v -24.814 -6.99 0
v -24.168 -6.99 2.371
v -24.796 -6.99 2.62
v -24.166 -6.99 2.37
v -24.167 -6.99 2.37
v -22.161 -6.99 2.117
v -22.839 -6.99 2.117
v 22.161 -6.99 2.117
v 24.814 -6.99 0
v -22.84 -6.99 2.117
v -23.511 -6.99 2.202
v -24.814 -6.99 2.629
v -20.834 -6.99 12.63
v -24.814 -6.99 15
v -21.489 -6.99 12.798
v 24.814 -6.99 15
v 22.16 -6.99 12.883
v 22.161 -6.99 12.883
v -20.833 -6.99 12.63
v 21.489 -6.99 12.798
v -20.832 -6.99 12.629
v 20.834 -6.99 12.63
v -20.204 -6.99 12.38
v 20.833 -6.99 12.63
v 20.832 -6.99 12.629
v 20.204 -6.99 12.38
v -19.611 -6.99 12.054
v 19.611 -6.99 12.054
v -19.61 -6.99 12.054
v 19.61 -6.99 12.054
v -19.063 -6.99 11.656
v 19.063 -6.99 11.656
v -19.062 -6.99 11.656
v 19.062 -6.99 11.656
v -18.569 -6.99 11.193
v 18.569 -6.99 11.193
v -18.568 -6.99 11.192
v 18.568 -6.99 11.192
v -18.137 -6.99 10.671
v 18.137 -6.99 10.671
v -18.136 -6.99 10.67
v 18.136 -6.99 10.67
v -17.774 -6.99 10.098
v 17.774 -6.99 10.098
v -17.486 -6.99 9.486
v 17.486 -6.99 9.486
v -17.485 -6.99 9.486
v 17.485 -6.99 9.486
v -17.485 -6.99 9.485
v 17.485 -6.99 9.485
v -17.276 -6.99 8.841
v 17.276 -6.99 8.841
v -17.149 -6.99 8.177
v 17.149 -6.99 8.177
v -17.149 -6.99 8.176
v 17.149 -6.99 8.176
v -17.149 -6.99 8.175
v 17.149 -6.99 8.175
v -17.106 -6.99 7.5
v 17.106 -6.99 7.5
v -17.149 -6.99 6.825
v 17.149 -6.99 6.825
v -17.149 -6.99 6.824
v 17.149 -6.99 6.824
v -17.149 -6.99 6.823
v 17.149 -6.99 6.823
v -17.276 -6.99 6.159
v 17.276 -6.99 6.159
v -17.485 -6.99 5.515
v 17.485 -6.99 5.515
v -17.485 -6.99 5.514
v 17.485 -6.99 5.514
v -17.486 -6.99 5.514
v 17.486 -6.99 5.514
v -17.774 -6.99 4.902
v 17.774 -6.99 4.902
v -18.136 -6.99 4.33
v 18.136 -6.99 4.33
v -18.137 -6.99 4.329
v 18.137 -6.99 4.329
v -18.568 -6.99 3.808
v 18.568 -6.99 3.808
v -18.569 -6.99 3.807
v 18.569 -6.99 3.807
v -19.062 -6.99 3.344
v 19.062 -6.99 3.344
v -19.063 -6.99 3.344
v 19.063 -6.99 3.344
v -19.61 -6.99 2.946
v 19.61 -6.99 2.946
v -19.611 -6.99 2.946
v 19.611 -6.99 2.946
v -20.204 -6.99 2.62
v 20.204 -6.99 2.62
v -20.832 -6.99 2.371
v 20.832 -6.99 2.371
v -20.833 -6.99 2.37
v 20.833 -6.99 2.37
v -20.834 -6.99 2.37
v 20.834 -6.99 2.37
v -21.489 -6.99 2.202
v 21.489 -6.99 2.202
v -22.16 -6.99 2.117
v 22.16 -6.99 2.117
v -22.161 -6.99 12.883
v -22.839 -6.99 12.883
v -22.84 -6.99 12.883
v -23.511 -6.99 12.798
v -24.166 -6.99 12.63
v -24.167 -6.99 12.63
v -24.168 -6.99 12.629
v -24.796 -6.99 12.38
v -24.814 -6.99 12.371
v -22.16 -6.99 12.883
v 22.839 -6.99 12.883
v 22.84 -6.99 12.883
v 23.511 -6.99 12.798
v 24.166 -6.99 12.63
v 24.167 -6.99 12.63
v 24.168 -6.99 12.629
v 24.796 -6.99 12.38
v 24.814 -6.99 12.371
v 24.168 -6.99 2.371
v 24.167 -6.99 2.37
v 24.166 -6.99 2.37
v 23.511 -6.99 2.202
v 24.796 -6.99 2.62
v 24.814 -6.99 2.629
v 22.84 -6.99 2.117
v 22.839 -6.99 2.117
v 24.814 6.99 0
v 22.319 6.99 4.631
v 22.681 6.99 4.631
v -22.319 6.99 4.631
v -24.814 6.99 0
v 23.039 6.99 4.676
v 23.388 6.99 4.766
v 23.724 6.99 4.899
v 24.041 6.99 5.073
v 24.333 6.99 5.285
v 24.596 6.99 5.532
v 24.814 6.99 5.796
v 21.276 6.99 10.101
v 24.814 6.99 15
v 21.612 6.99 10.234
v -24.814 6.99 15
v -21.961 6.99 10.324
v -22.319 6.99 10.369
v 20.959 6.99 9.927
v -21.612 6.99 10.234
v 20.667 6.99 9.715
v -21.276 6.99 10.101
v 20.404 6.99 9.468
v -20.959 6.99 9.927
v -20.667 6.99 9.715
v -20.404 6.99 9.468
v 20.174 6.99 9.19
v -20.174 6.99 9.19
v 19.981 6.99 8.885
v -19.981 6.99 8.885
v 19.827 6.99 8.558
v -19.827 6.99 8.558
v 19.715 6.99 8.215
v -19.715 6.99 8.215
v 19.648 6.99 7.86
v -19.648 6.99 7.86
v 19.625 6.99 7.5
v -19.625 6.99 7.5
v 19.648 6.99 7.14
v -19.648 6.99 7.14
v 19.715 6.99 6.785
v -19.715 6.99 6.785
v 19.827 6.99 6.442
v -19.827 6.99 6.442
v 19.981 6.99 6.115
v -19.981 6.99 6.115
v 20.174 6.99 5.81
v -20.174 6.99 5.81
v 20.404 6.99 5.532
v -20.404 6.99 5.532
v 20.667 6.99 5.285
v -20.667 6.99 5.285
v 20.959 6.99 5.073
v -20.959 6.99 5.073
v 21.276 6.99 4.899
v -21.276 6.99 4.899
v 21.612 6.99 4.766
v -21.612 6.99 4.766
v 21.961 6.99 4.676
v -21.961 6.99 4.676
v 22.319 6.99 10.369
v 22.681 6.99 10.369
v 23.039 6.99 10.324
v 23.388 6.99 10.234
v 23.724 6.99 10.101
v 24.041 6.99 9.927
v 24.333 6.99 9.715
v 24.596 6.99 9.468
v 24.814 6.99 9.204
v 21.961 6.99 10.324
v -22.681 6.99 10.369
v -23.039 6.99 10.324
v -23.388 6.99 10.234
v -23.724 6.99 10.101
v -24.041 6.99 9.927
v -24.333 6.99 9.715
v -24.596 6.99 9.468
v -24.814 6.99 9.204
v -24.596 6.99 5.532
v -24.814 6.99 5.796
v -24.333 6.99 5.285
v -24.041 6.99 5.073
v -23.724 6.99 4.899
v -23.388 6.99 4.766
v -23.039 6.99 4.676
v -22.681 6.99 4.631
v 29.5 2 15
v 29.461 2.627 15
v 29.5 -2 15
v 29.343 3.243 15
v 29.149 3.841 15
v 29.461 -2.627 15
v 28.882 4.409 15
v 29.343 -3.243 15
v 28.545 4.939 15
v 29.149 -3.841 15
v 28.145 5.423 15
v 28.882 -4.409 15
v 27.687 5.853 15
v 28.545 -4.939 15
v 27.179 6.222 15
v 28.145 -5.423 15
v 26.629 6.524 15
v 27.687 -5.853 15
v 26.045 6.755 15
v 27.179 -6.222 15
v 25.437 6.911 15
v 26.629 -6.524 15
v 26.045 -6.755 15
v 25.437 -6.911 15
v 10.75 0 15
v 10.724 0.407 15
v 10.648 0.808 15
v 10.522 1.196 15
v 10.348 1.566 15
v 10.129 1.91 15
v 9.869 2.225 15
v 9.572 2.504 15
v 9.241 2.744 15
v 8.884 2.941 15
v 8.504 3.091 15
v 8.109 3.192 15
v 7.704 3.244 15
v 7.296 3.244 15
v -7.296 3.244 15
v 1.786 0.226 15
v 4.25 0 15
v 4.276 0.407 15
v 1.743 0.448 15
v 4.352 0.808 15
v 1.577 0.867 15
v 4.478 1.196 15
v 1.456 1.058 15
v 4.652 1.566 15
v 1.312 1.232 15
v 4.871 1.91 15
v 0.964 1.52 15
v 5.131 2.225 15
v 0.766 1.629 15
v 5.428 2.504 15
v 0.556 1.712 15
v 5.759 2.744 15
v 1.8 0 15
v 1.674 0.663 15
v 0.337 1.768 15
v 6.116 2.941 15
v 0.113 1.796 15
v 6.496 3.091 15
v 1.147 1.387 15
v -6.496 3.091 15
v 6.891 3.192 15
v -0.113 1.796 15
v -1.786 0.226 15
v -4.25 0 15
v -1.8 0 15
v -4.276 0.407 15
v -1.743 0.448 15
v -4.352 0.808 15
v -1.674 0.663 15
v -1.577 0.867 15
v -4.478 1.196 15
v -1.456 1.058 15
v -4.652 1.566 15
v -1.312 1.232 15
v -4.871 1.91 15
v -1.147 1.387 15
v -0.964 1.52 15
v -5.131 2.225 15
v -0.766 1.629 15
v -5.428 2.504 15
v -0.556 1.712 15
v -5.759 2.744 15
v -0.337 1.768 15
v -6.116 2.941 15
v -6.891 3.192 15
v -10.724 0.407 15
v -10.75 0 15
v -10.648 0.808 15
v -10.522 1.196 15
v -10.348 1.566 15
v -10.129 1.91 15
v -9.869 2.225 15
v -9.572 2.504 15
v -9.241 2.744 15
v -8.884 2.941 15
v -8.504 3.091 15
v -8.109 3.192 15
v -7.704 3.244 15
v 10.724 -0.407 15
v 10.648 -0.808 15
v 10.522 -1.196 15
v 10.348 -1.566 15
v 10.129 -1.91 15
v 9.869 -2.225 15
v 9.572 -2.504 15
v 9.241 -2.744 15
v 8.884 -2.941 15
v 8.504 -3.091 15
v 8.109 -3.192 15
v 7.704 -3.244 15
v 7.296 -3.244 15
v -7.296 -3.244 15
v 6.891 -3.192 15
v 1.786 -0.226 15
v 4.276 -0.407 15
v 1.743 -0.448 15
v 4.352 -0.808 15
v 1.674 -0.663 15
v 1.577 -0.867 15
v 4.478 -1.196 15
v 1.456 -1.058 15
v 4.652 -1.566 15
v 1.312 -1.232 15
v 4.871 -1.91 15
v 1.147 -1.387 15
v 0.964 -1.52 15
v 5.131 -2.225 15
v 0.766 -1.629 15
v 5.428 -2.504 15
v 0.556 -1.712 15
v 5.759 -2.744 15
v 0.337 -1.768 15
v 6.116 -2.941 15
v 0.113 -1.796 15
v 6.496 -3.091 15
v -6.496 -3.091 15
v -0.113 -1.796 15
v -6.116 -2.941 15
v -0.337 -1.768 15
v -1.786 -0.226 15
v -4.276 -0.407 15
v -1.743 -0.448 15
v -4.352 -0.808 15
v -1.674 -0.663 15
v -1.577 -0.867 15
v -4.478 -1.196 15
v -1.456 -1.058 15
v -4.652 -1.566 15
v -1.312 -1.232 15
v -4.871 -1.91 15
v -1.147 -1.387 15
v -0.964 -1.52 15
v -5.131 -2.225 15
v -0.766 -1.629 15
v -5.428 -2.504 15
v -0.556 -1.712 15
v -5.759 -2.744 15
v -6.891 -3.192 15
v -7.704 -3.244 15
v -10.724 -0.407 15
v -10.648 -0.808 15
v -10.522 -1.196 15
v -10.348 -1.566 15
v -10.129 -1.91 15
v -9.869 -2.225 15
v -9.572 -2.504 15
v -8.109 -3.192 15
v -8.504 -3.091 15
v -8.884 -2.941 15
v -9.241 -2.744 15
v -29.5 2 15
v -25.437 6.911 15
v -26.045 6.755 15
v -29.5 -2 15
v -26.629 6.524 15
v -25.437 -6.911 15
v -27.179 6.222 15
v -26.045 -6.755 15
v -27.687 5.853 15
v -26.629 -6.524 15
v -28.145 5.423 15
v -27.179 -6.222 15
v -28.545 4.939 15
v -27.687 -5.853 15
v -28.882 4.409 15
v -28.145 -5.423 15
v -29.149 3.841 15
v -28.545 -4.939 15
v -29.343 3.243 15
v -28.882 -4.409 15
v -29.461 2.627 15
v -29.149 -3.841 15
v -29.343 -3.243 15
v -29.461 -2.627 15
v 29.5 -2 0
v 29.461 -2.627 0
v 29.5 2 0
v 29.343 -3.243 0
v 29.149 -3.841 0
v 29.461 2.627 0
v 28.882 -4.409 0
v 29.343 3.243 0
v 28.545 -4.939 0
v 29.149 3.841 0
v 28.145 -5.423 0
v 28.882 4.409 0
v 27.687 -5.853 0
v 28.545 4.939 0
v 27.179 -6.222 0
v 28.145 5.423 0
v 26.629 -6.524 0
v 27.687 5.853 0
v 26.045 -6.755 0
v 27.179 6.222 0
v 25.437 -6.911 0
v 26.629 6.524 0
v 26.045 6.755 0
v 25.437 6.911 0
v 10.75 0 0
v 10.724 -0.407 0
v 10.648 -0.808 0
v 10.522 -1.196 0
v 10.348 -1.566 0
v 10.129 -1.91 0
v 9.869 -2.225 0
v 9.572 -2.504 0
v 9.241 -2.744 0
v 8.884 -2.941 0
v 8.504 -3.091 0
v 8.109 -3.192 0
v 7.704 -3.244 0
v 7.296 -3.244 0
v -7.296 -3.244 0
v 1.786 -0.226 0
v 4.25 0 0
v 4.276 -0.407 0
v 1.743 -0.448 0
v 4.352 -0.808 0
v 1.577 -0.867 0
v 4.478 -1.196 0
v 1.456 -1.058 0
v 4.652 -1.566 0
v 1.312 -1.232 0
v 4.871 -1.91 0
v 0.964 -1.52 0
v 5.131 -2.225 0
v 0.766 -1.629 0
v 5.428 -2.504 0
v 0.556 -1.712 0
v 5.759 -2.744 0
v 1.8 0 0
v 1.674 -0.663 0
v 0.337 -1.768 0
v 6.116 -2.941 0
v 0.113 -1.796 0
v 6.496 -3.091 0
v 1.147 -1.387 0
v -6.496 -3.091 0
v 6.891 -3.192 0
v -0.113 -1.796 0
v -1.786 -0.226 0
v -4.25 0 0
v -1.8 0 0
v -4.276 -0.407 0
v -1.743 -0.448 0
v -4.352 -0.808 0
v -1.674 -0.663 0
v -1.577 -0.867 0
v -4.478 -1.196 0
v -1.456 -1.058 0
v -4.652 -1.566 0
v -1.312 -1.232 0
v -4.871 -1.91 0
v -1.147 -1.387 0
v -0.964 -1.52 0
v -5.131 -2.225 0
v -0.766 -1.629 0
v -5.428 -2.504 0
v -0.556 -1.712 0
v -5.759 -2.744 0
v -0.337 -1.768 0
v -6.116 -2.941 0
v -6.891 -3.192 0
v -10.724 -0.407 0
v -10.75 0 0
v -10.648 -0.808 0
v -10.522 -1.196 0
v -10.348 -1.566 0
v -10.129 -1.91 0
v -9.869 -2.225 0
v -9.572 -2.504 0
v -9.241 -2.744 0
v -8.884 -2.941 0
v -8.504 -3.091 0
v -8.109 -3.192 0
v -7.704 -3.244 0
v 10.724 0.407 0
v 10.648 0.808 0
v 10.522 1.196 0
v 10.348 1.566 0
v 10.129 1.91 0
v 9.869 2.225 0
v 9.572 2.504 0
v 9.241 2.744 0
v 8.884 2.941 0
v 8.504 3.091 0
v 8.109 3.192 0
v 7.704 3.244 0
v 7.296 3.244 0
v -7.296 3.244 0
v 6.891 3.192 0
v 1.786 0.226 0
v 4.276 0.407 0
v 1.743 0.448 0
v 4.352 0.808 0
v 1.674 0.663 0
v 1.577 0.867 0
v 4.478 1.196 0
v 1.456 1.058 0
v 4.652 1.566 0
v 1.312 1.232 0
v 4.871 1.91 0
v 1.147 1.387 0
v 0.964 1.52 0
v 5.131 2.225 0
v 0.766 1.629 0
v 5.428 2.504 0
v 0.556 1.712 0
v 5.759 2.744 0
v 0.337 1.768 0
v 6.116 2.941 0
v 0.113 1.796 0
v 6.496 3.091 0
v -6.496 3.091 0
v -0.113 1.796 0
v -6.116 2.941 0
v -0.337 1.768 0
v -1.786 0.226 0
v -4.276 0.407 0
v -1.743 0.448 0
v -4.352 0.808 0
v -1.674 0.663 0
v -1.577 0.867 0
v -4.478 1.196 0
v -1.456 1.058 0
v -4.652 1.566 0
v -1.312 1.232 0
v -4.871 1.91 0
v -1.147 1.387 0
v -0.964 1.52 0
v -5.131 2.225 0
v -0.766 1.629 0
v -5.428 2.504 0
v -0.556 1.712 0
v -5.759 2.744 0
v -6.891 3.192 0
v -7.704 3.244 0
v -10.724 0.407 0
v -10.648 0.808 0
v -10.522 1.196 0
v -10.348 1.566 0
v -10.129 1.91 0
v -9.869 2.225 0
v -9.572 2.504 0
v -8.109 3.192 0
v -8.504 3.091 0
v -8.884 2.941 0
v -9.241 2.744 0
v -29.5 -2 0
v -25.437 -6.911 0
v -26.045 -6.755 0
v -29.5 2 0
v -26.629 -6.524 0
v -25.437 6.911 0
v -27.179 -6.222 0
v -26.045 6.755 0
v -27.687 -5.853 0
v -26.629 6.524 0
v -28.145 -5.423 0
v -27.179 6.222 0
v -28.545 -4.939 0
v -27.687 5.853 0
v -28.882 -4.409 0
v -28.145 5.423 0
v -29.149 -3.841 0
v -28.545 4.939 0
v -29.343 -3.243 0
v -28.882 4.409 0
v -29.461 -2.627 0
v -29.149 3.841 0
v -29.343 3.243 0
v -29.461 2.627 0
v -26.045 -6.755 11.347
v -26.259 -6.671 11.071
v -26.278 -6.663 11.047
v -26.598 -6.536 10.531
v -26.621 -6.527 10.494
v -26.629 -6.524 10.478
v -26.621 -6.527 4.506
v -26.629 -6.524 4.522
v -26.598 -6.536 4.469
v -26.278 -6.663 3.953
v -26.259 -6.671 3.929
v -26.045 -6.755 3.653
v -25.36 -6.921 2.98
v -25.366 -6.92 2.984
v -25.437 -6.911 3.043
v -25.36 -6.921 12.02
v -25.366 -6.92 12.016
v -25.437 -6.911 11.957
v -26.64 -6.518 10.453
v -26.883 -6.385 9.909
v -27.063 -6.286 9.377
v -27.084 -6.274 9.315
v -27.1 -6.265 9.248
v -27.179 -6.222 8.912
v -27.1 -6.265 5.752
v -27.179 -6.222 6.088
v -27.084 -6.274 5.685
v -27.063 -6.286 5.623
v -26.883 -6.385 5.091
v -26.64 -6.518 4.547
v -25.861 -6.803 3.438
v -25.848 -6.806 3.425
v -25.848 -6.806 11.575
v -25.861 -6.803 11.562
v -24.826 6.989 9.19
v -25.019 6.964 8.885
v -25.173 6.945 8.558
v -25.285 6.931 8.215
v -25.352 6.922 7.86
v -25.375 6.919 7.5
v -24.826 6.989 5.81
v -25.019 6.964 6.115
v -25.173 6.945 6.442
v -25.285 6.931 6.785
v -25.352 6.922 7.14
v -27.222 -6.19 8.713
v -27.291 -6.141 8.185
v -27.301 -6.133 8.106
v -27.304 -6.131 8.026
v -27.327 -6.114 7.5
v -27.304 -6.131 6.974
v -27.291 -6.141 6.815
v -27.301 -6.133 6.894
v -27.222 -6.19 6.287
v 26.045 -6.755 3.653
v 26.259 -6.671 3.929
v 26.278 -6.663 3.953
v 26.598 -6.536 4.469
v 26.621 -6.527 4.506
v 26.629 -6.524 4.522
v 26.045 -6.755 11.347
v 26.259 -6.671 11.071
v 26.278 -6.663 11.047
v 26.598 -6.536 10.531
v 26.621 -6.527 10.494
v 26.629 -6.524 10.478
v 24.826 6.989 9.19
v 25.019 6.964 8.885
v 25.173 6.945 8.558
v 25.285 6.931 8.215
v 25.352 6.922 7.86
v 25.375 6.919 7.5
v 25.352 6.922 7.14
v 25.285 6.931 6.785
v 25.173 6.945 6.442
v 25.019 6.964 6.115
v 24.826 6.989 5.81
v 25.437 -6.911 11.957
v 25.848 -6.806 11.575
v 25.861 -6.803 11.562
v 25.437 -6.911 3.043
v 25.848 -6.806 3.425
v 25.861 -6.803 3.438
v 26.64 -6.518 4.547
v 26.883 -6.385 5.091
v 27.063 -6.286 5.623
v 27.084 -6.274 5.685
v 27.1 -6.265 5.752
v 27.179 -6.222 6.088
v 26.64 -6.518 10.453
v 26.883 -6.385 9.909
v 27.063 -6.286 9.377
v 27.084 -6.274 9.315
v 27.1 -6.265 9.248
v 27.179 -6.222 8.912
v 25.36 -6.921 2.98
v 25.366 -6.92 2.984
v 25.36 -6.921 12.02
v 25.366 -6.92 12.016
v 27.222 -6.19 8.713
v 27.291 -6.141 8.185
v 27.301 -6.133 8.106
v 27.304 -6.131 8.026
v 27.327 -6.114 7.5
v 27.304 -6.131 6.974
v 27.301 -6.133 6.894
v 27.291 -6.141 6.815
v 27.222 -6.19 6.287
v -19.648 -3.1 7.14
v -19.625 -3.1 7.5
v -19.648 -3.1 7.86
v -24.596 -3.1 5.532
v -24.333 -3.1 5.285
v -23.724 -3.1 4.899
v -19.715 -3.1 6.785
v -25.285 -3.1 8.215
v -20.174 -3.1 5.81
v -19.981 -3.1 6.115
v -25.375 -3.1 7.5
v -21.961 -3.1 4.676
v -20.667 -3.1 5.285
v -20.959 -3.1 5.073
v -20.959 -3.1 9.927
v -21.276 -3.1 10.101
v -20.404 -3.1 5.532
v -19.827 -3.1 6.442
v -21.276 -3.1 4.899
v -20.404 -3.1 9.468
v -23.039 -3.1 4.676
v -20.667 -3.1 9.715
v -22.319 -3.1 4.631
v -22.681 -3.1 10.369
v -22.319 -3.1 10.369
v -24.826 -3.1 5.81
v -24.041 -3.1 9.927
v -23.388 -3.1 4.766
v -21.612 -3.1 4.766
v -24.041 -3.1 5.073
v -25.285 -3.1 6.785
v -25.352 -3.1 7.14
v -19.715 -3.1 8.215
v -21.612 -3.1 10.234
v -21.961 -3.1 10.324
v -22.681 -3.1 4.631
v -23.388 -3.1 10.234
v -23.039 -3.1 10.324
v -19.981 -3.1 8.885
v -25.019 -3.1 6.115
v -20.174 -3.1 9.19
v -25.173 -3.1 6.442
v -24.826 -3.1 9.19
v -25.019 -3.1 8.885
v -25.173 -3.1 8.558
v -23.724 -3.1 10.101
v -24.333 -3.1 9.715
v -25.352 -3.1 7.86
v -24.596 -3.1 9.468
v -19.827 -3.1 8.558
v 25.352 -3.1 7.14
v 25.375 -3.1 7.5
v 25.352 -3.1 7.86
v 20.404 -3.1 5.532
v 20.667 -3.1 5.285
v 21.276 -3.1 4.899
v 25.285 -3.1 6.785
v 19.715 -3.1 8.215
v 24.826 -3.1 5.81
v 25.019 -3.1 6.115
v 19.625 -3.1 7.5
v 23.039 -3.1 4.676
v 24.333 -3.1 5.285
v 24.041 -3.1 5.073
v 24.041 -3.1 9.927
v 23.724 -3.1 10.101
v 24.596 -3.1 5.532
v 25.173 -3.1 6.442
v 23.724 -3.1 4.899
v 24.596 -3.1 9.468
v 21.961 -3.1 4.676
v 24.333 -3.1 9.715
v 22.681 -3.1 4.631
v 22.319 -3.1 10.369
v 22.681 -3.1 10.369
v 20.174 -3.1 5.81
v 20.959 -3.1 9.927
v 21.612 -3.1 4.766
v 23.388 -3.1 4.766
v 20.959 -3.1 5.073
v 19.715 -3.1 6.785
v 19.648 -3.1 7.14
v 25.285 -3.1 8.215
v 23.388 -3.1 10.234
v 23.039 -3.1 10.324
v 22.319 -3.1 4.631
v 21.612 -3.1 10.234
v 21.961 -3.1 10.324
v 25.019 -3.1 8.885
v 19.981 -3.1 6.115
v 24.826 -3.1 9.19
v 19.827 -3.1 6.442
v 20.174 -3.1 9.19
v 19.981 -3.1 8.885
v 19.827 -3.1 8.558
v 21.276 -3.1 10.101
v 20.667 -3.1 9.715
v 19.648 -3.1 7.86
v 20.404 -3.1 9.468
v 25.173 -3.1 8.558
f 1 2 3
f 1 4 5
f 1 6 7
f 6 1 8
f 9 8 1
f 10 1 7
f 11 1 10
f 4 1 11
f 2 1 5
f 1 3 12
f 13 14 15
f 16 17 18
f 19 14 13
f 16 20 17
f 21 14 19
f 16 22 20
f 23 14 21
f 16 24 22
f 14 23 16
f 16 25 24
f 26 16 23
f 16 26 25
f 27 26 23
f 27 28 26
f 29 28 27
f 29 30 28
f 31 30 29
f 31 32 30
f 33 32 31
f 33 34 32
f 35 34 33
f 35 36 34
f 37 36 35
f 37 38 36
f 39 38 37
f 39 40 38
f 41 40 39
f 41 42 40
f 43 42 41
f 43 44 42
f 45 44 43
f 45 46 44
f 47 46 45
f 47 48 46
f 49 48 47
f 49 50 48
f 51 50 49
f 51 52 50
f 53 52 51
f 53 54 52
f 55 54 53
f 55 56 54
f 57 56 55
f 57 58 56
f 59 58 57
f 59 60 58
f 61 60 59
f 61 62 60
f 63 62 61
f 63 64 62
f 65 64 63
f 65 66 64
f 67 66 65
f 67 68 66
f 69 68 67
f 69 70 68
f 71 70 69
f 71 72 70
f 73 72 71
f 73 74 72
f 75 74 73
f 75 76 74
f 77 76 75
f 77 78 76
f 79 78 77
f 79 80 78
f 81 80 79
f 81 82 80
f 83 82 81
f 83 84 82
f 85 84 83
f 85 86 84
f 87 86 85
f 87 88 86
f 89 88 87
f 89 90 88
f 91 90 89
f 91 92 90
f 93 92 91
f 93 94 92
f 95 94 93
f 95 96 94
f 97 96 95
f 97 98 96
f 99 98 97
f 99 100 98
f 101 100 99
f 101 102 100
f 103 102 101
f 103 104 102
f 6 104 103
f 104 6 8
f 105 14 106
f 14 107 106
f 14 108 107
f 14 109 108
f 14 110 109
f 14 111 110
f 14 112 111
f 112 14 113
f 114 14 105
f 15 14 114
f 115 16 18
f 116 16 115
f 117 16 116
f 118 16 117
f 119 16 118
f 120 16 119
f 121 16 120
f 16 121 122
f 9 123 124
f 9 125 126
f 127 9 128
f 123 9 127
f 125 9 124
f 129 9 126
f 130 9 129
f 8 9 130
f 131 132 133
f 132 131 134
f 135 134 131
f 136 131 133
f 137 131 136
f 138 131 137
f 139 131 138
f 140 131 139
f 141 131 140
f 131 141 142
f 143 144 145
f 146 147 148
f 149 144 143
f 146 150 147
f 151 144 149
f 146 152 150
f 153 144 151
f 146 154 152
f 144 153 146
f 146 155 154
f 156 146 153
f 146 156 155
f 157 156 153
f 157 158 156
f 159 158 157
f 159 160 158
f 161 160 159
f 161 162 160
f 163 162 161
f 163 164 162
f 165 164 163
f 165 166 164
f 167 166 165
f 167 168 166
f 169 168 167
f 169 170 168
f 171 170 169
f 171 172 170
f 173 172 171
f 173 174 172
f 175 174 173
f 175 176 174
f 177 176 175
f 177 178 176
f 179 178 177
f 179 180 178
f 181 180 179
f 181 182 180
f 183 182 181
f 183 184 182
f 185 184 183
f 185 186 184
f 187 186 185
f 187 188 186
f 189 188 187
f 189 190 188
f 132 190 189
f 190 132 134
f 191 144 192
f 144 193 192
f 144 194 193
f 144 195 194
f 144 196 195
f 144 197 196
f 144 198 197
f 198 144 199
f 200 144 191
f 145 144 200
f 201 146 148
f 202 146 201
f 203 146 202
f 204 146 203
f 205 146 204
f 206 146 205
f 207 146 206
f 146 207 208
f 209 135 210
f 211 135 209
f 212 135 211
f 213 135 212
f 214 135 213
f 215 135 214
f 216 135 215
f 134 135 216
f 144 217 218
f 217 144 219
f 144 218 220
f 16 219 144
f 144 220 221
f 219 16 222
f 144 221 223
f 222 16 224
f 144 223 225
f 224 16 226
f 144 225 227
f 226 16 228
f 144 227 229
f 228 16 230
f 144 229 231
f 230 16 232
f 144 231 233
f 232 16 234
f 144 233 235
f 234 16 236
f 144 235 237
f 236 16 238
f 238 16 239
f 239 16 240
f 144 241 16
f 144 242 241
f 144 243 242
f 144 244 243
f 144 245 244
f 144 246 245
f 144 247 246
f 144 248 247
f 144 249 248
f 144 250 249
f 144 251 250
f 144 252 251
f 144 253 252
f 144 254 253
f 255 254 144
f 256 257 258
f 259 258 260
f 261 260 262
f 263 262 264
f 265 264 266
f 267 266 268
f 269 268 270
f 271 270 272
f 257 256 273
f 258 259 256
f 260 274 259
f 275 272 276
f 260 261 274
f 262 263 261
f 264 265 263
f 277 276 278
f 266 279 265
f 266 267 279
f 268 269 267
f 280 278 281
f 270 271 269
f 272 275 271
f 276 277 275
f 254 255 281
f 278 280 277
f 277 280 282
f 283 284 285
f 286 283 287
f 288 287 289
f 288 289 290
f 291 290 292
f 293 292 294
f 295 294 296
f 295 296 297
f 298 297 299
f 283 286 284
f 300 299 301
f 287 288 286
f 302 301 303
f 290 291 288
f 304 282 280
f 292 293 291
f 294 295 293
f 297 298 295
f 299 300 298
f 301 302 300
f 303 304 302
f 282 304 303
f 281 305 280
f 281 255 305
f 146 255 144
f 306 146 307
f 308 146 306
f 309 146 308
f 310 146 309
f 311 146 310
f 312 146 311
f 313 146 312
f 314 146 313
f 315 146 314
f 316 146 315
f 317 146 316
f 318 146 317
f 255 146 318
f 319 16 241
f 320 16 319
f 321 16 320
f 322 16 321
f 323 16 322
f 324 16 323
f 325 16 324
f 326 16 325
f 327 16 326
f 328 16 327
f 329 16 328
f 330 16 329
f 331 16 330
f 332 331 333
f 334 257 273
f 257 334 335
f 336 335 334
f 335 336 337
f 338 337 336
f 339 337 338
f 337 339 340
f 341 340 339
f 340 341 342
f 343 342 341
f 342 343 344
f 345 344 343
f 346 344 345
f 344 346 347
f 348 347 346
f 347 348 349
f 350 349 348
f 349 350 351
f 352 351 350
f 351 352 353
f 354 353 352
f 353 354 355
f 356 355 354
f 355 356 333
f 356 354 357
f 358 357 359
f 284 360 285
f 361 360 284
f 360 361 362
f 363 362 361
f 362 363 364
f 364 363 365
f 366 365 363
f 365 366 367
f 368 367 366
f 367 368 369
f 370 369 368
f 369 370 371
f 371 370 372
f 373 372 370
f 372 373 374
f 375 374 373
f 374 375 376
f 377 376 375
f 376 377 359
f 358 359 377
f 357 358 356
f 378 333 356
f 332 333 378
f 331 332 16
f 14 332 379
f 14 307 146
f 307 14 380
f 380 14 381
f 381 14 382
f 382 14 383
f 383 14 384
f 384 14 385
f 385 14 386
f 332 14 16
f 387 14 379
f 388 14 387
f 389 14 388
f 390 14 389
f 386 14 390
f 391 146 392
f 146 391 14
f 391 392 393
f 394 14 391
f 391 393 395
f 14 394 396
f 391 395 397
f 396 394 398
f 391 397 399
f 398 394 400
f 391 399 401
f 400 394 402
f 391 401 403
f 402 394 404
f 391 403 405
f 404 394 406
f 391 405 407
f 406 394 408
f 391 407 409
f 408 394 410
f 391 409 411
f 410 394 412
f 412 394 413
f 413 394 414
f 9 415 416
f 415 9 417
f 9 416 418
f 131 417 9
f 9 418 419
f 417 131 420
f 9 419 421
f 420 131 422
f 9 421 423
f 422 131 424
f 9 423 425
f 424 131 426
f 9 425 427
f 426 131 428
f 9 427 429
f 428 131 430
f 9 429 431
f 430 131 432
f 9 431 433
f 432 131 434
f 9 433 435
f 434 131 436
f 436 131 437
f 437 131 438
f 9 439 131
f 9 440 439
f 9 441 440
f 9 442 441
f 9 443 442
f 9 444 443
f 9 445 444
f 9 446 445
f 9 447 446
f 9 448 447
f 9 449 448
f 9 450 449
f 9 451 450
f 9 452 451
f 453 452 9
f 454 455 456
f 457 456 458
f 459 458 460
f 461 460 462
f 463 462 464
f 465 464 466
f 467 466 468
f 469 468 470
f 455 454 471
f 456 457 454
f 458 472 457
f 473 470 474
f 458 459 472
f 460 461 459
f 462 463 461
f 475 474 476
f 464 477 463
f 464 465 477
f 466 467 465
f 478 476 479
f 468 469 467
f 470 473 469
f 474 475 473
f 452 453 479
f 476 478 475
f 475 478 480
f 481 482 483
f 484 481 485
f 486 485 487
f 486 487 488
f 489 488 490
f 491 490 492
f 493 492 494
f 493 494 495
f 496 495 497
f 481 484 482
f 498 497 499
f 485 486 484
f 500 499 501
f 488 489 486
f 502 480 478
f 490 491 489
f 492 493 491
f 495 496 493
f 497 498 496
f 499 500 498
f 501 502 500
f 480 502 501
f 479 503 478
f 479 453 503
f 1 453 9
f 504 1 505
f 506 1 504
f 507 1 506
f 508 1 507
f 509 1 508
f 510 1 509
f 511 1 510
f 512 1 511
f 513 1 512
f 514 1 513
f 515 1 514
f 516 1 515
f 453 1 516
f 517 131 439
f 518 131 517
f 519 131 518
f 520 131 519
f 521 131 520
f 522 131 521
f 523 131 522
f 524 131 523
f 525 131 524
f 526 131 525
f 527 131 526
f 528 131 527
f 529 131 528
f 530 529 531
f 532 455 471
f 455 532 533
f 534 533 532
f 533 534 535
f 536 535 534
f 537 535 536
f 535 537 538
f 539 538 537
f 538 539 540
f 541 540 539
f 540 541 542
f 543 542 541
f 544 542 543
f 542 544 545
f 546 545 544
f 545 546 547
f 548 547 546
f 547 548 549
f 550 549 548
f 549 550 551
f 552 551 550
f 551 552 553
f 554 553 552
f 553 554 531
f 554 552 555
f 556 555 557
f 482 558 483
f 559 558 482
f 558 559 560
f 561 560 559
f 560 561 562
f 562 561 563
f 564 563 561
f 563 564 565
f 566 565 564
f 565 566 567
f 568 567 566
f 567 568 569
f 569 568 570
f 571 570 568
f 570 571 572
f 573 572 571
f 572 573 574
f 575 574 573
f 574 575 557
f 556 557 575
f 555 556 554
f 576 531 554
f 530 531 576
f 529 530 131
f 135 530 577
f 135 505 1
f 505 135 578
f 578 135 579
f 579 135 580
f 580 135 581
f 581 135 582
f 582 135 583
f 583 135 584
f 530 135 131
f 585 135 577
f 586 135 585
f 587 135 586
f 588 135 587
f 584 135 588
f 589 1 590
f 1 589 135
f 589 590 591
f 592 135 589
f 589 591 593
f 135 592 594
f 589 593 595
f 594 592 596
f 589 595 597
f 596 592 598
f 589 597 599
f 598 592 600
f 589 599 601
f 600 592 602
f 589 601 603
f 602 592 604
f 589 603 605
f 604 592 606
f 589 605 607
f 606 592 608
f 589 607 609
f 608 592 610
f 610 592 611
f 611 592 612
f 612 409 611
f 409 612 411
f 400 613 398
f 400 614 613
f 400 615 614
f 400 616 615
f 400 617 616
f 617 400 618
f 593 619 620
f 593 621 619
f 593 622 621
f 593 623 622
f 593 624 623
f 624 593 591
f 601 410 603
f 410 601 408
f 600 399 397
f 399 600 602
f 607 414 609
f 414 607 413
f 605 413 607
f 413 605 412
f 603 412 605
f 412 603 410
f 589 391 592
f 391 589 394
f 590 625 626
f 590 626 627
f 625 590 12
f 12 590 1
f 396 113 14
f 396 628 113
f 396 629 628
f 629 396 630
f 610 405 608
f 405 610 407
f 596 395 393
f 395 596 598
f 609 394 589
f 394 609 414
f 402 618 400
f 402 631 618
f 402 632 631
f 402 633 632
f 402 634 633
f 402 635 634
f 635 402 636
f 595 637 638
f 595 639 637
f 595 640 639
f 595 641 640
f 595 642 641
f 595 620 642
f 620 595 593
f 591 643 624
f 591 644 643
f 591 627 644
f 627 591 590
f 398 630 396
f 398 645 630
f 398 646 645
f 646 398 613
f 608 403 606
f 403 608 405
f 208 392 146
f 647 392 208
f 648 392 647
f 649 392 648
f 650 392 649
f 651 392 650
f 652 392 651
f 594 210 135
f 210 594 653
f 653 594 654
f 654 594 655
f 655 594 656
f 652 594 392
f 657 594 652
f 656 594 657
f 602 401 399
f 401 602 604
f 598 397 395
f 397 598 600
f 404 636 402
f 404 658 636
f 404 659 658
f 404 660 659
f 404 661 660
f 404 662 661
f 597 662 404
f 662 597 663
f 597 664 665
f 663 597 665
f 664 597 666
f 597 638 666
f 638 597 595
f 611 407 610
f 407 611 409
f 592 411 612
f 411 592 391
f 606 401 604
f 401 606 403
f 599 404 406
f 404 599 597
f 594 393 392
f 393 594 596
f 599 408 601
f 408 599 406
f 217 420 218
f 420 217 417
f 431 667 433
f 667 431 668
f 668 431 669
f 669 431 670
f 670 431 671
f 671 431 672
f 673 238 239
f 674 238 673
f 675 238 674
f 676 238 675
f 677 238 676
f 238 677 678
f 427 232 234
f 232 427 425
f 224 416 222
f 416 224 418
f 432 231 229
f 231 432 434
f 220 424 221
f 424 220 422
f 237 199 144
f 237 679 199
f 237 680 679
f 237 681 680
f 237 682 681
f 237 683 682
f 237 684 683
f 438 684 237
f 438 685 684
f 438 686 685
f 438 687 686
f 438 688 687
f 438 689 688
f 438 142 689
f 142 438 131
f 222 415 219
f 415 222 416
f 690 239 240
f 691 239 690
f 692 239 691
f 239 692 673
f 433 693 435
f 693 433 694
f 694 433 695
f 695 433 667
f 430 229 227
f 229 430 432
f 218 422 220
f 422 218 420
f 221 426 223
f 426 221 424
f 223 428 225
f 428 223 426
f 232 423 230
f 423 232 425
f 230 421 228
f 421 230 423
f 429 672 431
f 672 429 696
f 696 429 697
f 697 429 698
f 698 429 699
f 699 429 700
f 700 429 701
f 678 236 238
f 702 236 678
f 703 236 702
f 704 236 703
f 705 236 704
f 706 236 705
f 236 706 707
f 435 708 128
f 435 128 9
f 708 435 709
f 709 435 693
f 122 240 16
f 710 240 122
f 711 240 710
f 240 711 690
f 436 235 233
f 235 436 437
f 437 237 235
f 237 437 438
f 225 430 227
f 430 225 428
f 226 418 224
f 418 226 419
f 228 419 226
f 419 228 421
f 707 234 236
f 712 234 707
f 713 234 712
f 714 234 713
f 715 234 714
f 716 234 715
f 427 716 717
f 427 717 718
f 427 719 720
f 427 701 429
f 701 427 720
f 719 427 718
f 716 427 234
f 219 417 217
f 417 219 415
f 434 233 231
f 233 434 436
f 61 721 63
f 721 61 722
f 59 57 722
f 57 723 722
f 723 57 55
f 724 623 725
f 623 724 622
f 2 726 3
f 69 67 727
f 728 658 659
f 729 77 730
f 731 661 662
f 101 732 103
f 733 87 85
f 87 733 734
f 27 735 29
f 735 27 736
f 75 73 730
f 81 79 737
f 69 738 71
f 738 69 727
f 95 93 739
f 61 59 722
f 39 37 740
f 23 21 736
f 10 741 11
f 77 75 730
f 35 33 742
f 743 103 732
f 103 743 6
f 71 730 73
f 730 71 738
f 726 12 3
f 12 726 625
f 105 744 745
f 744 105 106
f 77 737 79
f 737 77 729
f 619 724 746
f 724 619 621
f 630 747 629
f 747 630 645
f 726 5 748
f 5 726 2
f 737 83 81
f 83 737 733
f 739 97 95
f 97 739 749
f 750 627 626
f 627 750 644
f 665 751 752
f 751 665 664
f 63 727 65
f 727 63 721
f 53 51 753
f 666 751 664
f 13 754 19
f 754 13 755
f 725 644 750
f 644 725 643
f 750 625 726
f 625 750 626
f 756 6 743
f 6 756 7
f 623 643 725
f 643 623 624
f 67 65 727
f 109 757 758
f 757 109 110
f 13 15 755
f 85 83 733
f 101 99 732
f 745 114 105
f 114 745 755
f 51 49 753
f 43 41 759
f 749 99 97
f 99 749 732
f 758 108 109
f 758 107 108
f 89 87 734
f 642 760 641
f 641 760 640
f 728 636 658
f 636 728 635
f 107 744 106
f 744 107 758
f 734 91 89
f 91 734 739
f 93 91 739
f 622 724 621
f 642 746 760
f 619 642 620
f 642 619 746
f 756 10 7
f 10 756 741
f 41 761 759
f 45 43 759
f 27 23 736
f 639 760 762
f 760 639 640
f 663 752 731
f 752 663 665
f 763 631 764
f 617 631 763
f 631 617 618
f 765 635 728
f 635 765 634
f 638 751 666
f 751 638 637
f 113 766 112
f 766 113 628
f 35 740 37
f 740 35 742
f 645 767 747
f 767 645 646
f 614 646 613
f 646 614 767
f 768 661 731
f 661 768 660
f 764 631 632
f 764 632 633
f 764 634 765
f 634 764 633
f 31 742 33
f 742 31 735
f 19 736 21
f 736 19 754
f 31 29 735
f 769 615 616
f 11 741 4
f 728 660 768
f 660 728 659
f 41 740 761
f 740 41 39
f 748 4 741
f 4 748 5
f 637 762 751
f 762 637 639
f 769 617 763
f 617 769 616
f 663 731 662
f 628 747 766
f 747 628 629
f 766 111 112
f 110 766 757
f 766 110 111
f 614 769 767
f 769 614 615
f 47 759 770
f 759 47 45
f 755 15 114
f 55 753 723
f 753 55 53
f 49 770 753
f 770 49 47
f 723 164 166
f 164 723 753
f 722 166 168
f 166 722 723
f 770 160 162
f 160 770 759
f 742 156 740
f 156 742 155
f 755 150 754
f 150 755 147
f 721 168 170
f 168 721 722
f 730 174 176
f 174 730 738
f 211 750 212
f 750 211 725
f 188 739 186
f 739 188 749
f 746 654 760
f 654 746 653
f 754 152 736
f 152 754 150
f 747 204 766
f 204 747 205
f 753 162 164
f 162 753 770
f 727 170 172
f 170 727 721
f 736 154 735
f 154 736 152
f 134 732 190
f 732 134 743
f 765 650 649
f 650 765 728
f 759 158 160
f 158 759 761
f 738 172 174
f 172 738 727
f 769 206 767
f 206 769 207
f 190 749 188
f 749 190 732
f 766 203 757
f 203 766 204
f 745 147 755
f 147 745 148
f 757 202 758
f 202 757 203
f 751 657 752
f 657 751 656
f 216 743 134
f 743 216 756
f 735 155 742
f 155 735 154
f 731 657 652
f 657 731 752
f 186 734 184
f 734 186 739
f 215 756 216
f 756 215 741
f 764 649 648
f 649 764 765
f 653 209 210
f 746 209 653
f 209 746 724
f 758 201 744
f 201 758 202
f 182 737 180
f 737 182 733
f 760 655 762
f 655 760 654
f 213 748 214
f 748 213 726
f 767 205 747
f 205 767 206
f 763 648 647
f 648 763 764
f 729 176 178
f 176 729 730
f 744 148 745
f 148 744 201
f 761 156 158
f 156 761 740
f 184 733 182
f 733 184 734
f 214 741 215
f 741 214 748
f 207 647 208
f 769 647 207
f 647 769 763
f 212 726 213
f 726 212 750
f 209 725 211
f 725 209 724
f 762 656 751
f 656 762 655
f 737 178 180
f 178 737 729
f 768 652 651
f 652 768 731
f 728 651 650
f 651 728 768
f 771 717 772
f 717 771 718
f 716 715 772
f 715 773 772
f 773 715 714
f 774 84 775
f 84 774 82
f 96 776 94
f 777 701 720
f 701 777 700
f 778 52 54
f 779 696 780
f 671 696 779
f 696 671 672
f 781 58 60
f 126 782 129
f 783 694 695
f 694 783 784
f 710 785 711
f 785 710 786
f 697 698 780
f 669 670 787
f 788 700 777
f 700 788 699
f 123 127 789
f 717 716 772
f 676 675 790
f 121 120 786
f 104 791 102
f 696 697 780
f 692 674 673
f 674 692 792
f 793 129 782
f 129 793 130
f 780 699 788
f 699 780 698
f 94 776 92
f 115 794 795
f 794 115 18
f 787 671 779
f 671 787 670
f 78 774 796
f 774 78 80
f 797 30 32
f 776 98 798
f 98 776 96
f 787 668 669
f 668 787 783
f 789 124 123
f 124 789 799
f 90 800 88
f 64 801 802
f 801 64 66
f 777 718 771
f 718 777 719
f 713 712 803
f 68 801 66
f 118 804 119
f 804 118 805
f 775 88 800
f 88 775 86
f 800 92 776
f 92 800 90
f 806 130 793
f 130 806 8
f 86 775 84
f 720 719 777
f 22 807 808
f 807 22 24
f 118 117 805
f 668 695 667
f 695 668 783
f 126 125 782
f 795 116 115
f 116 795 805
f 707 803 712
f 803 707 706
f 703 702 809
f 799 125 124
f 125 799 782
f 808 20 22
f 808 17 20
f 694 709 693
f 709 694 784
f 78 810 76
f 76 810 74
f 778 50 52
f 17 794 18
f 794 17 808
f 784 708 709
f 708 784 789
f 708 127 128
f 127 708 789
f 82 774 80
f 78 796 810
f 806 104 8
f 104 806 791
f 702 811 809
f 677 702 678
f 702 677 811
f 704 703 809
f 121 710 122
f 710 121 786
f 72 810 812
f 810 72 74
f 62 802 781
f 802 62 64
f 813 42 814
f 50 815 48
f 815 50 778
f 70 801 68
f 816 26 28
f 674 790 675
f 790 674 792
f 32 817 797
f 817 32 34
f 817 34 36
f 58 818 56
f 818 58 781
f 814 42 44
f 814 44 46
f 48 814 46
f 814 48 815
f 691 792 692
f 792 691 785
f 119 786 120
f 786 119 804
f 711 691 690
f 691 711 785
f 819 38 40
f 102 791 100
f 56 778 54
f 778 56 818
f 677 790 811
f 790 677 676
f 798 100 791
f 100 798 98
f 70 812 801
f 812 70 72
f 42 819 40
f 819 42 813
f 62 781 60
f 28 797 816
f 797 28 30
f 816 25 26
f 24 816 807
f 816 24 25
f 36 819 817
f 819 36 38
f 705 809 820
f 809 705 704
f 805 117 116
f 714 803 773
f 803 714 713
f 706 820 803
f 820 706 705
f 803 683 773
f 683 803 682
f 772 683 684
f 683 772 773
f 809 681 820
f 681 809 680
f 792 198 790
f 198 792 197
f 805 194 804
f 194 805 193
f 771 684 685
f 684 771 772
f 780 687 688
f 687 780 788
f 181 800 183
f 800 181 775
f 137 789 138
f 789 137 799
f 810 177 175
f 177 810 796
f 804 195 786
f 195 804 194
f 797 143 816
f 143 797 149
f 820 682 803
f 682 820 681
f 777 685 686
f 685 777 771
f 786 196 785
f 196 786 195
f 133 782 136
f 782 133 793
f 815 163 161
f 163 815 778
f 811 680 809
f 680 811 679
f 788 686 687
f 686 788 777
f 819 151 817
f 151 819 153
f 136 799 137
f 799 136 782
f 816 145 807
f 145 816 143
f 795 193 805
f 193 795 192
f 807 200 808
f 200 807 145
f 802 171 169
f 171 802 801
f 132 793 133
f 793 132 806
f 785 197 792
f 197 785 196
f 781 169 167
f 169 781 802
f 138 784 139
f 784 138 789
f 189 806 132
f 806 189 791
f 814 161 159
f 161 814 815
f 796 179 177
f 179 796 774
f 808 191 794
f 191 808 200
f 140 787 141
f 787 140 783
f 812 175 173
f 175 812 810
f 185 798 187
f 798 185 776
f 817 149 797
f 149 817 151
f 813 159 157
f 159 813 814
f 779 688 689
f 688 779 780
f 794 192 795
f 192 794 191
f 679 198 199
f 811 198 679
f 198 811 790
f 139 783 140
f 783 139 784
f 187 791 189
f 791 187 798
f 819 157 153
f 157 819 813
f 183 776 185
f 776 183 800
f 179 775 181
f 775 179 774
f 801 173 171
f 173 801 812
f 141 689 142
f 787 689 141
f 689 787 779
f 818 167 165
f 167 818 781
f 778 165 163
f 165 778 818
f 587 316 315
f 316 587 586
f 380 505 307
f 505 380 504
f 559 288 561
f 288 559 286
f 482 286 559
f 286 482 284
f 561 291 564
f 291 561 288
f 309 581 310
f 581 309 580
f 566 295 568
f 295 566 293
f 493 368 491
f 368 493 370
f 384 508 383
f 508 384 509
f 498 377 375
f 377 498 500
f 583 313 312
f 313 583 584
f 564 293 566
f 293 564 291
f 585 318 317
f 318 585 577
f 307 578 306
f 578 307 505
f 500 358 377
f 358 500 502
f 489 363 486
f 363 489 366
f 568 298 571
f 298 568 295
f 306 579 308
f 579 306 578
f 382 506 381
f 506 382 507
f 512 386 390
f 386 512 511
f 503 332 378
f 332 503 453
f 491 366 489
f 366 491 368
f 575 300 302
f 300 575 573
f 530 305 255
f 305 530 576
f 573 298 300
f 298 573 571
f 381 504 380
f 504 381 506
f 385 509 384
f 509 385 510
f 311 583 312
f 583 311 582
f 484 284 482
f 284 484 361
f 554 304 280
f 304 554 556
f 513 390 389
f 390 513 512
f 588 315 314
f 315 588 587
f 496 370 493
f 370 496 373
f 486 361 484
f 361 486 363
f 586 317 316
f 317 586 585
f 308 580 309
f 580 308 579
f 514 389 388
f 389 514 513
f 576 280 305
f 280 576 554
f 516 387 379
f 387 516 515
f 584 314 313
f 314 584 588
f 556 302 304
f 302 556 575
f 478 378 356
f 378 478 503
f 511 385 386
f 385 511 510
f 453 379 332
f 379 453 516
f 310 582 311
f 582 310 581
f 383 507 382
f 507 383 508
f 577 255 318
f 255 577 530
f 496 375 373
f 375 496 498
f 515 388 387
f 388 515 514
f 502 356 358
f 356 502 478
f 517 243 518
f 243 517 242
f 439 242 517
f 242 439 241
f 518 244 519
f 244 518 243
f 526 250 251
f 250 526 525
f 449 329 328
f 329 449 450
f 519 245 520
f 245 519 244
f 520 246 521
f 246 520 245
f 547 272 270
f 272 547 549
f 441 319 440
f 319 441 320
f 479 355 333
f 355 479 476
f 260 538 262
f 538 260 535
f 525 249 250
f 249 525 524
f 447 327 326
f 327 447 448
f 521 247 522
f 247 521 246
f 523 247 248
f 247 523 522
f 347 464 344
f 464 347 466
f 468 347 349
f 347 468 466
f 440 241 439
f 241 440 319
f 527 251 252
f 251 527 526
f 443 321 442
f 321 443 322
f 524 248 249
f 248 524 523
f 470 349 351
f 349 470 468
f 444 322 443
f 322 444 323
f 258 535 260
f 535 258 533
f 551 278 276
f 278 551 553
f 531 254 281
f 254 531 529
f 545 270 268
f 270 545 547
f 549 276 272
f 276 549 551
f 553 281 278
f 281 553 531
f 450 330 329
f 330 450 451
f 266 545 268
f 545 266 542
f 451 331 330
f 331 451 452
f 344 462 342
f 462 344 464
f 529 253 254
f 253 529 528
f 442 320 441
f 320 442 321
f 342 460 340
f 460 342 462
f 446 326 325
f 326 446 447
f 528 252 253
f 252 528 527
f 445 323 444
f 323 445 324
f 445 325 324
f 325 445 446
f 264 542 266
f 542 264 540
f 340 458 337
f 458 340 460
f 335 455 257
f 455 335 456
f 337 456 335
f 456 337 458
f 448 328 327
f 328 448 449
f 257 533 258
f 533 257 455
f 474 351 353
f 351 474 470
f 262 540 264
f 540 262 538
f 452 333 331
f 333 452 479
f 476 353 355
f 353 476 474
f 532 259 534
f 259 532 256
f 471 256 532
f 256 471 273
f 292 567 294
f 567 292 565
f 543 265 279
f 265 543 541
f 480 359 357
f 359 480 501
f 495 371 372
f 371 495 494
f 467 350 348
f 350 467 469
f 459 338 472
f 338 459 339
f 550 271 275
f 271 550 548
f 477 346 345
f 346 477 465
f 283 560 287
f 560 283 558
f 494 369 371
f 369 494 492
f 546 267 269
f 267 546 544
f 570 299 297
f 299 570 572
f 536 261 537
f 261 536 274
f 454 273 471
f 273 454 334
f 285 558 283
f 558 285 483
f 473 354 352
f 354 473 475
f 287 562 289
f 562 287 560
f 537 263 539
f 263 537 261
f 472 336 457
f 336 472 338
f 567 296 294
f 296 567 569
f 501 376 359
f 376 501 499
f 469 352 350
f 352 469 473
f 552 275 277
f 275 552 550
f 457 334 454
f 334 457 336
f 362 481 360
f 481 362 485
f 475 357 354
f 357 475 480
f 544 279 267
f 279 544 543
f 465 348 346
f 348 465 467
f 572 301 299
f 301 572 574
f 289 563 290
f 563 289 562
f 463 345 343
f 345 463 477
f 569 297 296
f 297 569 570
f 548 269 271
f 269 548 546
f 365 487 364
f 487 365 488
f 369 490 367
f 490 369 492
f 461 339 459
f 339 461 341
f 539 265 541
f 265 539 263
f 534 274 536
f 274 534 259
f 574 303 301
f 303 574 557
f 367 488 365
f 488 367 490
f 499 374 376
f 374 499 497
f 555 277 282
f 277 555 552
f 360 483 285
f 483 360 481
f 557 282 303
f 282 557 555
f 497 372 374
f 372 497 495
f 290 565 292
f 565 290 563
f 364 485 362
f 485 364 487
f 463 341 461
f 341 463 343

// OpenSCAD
$fn = 50;


difference() {
	union() {
		hull() {
			translate(v = [-9.5000000000, 2.0000000000, 0]) {
				cylinder(h = 15, r = 5);
			}
			translate(v = [9.5000000000, 2.0000000000, 0]) {
				cylinder(h = 15, r = 5);
			}
			translate(v = [-9.5000000000, -2.0000000000, 0]) {
				cylinder(h = 15, r = 5);
			}
			translate(v = [9.5000000000, -2.0000000000, 0]) {
				cylinder(h = 15, r = 5);
			}
		}
		translate(v = [-15.0000000000, 0.0000000000, 0]) {
			hull() {
				translate(v = [-9.5000000000, 2.0000000000, 0]) {
					cylinder(h = 15, r = 5);
				}
				translate(v = [9.5000000000, 2.0000000000, 0]) {
					cylinder(h = 15, r = 5);
				}
				translate(v = [-9.5000000000, -2.0000000000, 0]) {
					cylinder(h = 15, r = 5);
				}
				translate(v = [9.5000000000, -2.0000000000, 0]) {
					cylinder(h = 15, r = 5);
				}
			}
		}
		translate(v = [15.0000000000, 0.0000000000, 0]) {
			hull() {
				translate(v = [-9.5000000000, 2.0000000000, 0]) {
					cylinder(h = 15, r = 5);
				}
				translate(v = [9.5000000000, 2.0000000000, 0]) {
					cylinder(h = 15, r = 5);
				}
				translate(v = [-9.5000000000, -2.0000000000, 0]) {
					cylinder(h = 15, r = 5);
				}
				translate(v = [9.5000000000, -2.0000000000, 0]) {
					cylinder(h = 15, r = 5);
				}
			}
		}
	}
	union() {
		translate(v = [-22.5000000000, -7.0000000000, 7.5000000000]) {
			rotate(a = [90, 0, 0]) {
				difference() {
					union() {
						#translate(v = [0, 0, -14.0000000000]) {
							cylinder(h = 14, r = 2.6000000000);
						}
						#translate(v = [0, 0, -3.9000000000]) {
							cylinder(h = 3.9000000000, r1 = 2.8750000000, r2 = 5.4000000000);
						}
						#translate(v = [0, 0, -14.0000000000]) {
							cylinder(h = 14, r = 2.8750000000);
						}
						#translate(v = [0, 0, -14.0000000000]) {
							cylinder(h = 14, r = 2.6000000000);
						}
					}
					union();
				}
			}
		}
		translate(v = [22.5000000000, -7.0000000000, 7.5000000000]) {
			rotate(a = [90, 0, 0]) {
				difference() {
					union() {
						#translate(v = [0, 0, -14.0000000000]) {
							cylinder(h = 14, r = 2.6000000000);
						}
						#translate(v = [0, 0, -3.9000000000]) {
							cylinder(h = 3.9000000000, r1 = 2.8750000000, r2 = 5.4000000000);
						}
						#translate(v = [0, 0, -14.0000000000]) {
							cylinder(h = 14, r = 2.8750000000);
						}
						#translate(v = [0, 0, -14.0000000000]) {
							cylinder(h = 14, r = 2.6000000000);
						}
					}
					union();
				}
			}
		}
		translate(v = [-7.5000000000, 0.0000000000, 0]) {
			translate(v = [0, 0, -100]) {
				cylinder(h = 200, r = 3.2500000000);
			}
		}
		translate(v = [7.5000000000, 0.0000000000, 0]) {
			translate(v = [0, 0, -100]) {
				cylinder(h = 200, r = 3.2500000000);
			}
		}
		translate(v = [-7.5000000000, 0.0000000000, 0]) {
			translate(v = [0, 0, -100]) {
				cylinder(h = 200, r = 1.8000000000);
			}
		}
		translate(v = [0, 0, -100]) {
			cylinder(h = 200, r = 1.8000000000);
		}
		translate(v = [7.5000000000, 0.0000000000, 0]) {
			translate(v = [0, 0, -100]) {
				cylinder(h = 200, r = 1.8000000000);
			}
		}
	}
}
